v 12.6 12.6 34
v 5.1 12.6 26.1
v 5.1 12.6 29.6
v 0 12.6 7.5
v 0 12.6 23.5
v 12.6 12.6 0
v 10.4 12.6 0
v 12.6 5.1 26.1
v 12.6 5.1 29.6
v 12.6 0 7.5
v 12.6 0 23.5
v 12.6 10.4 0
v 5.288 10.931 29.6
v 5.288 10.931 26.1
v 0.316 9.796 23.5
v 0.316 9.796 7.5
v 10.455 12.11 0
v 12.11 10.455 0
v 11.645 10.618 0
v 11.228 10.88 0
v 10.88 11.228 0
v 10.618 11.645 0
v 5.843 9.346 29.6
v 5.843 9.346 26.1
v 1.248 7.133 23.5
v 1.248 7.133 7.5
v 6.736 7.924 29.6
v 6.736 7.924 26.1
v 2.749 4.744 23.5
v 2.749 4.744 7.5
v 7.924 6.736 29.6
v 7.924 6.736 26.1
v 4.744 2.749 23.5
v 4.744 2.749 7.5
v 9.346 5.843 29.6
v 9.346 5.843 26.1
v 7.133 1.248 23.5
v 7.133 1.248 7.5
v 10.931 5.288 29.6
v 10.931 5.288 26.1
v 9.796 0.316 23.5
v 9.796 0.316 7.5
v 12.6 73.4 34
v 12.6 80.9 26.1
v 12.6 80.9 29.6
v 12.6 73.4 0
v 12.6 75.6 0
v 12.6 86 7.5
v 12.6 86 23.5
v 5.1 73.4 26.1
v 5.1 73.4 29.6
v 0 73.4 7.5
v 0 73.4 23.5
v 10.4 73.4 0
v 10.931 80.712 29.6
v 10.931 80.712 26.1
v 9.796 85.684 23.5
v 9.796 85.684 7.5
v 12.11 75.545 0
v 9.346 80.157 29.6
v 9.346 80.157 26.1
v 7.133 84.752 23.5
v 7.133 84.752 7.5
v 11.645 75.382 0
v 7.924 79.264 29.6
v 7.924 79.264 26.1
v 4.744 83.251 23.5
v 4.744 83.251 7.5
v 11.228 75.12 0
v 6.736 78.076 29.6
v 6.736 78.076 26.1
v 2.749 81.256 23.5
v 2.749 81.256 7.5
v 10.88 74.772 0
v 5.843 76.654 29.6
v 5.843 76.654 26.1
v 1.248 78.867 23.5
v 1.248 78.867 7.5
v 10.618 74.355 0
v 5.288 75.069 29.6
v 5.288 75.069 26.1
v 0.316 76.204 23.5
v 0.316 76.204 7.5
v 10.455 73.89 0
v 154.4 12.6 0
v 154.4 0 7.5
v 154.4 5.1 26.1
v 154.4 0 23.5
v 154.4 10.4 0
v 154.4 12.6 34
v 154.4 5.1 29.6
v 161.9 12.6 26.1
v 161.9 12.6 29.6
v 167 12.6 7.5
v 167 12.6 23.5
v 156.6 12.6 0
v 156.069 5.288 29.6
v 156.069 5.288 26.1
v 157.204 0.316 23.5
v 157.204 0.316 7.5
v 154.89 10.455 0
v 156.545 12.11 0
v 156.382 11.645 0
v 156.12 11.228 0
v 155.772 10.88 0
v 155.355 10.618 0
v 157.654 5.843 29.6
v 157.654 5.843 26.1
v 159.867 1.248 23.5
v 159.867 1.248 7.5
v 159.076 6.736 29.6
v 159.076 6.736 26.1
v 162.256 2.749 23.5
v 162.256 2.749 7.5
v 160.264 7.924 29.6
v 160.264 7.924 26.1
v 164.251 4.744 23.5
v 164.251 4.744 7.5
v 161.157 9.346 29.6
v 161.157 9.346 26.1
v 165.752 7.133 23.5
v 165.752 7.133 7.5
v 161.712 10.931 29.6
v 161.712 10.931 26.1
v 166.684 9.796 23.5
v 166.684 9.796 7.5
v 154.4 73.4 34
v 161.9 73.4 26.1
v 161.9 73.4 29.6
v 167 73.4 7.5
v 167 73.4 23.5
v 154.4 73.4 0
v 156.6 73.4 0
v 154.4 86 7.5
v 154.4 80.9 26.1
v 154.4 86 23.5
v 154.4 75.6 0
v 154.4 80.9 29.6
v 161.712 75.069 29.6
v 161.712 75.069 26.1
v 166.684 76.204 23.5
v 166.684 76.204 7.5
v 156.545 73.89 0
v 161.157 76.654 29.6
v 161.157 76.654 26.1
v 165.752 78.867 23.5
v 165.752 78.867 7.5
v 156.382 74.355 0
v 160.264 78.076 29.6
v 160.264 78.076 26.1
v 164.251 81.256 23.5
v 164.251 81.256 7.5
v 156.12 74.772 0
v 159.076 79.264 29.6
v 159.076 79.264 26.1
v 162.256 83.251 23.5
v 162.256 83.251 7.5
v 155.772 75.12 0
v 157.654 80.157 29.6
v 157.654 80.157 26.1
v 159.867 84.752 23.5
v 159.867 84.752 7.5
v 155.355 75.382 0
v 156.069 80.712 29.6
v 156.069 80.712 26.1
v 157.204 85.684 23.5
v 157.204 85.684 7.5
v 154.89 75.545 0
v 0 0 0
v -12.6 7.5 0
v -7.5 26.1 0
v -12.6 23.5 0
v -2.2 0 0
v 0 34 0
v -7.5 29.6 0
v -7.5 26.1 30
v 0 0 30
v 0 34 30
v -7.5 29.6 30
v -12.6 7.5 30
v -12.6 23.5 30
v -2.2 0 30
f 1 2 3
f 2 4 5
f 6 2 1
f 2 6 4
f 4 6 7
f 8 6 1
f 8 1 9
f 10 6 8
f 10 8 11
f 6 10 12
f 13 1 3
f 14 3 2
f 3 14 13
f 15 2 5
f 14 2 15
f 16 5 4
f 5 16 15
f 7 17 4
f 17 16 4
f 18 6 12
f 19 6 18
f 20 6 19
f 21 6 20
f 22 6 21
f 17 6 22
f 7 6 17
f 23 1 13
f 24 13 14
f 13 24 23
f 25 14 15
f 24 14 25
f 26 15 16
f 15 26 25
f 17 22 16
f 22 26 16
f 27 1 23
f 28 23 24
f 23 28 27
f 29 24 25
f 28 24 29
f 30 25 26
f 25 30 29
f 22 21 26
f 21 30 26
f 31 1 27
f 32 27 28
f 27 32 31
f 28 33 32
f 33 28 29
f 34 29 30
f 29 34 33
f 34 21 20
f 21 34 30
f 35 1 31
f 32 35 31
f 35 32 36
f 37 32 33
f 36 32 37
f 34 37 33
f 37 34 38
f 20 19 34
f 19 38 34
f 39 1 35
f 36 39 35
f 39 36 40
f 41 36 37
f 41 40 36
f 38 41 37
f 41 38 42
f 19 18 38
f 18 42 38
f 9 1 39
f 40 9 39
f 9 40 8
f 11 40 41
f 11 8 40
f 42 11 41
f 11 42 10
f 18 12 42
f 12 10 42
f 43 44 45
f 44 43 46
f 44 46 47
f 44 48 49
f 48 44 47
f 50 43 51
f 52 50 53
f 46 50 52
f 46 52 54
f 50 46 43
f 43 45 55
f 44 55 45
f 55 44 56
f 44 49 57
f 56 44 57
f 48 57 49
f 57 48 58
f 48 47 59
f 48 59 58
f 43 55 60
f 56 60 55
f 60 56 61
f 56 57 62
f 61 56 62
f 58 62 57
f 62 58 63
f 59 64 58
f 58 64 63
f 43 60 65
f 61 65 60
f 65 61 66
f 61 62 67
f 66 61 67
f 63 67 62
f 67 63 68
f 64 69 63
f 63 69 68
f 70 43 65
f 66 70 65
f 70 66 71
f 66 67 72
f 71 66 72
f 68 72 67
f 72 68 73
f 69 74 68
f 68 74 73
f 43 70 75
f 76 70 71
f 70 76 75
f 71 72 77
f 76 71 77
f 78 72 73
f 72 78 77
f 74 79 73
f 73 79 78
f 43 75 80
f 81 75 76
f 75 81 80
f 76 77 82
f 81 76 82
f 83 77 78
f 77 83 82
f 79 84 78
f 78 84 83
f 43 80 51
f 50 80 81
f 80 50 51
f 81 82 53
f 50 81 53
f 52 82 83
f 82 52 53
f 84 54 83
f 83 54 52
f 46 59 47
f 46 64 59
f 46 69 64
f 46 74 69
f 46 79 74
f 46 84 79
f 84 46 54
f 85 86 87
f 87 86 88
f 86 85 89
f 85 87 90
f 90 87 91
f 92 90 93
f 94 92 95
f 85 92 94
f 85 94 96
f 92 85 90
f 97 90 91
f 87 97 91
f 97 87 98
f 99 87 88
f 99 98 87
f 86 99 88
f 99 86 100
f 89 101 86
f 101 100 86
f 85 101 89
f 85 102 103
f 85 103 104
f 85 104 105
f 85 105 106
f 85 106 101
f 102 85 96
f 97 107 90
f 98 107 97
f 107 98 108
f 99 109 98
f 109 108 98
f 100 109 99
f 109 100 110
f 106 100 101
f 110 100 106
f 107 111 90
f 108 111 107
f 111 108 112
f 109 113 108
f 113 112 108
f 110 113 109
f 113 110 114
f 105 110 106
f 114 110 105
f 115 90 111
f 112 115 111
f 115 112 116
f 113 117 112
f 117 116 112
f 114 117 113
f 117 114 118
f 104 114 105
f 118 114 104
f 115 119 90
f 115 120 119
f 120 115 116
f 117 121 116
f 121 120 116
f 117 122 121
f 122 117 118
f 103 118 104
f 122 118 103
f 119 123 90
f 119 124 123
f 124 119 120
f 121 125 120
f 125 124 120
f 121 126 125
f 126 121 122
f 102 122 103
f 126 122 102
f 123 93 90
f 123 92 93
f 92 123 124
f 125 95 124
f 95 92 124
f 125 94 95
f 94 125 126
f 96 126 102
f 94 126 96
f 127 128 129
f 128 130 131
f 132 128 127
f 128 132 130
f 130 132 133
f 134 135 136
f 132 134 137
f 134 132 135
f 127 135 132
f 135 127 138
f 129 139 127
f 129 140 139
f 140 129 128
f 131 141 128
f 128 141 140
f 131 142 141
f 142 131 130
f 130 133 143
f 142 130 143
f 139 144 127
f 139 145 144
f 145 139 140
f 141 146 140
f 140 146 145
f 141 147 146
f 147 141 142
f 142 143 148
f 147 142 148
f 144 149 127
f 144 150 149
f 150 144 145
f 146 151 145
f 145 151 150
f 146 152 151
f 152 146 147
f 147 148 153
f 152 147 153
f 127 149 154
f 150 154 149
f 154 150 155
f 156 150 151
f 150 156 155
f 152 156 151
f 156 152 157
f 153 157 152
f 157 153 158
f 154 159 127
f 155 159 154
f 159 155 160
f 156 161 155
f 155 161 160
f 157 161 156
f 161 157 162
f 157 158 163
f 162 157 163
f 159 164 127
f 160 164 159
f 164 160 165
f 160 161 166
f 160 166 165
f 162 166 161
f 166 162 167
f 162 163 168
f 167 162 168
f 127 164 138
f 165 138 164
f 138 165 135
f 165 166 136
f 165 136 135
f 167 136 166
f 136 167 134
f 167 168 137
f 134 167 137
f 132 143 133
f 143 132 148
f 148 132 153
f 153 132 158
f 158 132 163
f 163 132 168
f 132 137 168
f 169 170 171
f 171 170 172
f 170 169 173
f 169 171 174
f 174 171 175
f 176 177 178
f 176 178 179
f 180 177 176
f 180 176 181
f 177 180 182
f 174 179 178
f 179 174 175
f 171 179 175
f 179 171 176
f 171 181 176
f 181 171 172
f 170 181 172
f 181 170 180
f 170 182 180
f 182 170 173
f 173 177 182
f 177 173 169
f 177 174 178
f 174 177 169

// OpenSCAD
$fn=30;

length = 167;

module side_shape(){
    translate([-12.6,0,0])
        polygon(points=[/*[-1, 0], [-1, 34], */[12.6, 34], [5.1, 34-4.4], [5.1, 34-4.4-3.5], [0, 34-10.5], [0, 7.5], [10.4, 0], [12.6, 0]]);
}

module corner(angle){
    rotate([0, 0, angle]) rotate_extrude(angle=90) side_shape();
}

module sides() {
angles = [0, 270, 90, 180];
translate([12.6, 12.6])
    for(i = [0:1]) for(j = [0:1])
        translate([i*(length-12.6*2), j*(86-12.6*2), 0]) corner(angles[i*2+j]);

rotate([]) linear_extrude(30) side_shape();
}

sides();
/*
0 0 0
1 0 90
1 1 180
0 1 270*/
